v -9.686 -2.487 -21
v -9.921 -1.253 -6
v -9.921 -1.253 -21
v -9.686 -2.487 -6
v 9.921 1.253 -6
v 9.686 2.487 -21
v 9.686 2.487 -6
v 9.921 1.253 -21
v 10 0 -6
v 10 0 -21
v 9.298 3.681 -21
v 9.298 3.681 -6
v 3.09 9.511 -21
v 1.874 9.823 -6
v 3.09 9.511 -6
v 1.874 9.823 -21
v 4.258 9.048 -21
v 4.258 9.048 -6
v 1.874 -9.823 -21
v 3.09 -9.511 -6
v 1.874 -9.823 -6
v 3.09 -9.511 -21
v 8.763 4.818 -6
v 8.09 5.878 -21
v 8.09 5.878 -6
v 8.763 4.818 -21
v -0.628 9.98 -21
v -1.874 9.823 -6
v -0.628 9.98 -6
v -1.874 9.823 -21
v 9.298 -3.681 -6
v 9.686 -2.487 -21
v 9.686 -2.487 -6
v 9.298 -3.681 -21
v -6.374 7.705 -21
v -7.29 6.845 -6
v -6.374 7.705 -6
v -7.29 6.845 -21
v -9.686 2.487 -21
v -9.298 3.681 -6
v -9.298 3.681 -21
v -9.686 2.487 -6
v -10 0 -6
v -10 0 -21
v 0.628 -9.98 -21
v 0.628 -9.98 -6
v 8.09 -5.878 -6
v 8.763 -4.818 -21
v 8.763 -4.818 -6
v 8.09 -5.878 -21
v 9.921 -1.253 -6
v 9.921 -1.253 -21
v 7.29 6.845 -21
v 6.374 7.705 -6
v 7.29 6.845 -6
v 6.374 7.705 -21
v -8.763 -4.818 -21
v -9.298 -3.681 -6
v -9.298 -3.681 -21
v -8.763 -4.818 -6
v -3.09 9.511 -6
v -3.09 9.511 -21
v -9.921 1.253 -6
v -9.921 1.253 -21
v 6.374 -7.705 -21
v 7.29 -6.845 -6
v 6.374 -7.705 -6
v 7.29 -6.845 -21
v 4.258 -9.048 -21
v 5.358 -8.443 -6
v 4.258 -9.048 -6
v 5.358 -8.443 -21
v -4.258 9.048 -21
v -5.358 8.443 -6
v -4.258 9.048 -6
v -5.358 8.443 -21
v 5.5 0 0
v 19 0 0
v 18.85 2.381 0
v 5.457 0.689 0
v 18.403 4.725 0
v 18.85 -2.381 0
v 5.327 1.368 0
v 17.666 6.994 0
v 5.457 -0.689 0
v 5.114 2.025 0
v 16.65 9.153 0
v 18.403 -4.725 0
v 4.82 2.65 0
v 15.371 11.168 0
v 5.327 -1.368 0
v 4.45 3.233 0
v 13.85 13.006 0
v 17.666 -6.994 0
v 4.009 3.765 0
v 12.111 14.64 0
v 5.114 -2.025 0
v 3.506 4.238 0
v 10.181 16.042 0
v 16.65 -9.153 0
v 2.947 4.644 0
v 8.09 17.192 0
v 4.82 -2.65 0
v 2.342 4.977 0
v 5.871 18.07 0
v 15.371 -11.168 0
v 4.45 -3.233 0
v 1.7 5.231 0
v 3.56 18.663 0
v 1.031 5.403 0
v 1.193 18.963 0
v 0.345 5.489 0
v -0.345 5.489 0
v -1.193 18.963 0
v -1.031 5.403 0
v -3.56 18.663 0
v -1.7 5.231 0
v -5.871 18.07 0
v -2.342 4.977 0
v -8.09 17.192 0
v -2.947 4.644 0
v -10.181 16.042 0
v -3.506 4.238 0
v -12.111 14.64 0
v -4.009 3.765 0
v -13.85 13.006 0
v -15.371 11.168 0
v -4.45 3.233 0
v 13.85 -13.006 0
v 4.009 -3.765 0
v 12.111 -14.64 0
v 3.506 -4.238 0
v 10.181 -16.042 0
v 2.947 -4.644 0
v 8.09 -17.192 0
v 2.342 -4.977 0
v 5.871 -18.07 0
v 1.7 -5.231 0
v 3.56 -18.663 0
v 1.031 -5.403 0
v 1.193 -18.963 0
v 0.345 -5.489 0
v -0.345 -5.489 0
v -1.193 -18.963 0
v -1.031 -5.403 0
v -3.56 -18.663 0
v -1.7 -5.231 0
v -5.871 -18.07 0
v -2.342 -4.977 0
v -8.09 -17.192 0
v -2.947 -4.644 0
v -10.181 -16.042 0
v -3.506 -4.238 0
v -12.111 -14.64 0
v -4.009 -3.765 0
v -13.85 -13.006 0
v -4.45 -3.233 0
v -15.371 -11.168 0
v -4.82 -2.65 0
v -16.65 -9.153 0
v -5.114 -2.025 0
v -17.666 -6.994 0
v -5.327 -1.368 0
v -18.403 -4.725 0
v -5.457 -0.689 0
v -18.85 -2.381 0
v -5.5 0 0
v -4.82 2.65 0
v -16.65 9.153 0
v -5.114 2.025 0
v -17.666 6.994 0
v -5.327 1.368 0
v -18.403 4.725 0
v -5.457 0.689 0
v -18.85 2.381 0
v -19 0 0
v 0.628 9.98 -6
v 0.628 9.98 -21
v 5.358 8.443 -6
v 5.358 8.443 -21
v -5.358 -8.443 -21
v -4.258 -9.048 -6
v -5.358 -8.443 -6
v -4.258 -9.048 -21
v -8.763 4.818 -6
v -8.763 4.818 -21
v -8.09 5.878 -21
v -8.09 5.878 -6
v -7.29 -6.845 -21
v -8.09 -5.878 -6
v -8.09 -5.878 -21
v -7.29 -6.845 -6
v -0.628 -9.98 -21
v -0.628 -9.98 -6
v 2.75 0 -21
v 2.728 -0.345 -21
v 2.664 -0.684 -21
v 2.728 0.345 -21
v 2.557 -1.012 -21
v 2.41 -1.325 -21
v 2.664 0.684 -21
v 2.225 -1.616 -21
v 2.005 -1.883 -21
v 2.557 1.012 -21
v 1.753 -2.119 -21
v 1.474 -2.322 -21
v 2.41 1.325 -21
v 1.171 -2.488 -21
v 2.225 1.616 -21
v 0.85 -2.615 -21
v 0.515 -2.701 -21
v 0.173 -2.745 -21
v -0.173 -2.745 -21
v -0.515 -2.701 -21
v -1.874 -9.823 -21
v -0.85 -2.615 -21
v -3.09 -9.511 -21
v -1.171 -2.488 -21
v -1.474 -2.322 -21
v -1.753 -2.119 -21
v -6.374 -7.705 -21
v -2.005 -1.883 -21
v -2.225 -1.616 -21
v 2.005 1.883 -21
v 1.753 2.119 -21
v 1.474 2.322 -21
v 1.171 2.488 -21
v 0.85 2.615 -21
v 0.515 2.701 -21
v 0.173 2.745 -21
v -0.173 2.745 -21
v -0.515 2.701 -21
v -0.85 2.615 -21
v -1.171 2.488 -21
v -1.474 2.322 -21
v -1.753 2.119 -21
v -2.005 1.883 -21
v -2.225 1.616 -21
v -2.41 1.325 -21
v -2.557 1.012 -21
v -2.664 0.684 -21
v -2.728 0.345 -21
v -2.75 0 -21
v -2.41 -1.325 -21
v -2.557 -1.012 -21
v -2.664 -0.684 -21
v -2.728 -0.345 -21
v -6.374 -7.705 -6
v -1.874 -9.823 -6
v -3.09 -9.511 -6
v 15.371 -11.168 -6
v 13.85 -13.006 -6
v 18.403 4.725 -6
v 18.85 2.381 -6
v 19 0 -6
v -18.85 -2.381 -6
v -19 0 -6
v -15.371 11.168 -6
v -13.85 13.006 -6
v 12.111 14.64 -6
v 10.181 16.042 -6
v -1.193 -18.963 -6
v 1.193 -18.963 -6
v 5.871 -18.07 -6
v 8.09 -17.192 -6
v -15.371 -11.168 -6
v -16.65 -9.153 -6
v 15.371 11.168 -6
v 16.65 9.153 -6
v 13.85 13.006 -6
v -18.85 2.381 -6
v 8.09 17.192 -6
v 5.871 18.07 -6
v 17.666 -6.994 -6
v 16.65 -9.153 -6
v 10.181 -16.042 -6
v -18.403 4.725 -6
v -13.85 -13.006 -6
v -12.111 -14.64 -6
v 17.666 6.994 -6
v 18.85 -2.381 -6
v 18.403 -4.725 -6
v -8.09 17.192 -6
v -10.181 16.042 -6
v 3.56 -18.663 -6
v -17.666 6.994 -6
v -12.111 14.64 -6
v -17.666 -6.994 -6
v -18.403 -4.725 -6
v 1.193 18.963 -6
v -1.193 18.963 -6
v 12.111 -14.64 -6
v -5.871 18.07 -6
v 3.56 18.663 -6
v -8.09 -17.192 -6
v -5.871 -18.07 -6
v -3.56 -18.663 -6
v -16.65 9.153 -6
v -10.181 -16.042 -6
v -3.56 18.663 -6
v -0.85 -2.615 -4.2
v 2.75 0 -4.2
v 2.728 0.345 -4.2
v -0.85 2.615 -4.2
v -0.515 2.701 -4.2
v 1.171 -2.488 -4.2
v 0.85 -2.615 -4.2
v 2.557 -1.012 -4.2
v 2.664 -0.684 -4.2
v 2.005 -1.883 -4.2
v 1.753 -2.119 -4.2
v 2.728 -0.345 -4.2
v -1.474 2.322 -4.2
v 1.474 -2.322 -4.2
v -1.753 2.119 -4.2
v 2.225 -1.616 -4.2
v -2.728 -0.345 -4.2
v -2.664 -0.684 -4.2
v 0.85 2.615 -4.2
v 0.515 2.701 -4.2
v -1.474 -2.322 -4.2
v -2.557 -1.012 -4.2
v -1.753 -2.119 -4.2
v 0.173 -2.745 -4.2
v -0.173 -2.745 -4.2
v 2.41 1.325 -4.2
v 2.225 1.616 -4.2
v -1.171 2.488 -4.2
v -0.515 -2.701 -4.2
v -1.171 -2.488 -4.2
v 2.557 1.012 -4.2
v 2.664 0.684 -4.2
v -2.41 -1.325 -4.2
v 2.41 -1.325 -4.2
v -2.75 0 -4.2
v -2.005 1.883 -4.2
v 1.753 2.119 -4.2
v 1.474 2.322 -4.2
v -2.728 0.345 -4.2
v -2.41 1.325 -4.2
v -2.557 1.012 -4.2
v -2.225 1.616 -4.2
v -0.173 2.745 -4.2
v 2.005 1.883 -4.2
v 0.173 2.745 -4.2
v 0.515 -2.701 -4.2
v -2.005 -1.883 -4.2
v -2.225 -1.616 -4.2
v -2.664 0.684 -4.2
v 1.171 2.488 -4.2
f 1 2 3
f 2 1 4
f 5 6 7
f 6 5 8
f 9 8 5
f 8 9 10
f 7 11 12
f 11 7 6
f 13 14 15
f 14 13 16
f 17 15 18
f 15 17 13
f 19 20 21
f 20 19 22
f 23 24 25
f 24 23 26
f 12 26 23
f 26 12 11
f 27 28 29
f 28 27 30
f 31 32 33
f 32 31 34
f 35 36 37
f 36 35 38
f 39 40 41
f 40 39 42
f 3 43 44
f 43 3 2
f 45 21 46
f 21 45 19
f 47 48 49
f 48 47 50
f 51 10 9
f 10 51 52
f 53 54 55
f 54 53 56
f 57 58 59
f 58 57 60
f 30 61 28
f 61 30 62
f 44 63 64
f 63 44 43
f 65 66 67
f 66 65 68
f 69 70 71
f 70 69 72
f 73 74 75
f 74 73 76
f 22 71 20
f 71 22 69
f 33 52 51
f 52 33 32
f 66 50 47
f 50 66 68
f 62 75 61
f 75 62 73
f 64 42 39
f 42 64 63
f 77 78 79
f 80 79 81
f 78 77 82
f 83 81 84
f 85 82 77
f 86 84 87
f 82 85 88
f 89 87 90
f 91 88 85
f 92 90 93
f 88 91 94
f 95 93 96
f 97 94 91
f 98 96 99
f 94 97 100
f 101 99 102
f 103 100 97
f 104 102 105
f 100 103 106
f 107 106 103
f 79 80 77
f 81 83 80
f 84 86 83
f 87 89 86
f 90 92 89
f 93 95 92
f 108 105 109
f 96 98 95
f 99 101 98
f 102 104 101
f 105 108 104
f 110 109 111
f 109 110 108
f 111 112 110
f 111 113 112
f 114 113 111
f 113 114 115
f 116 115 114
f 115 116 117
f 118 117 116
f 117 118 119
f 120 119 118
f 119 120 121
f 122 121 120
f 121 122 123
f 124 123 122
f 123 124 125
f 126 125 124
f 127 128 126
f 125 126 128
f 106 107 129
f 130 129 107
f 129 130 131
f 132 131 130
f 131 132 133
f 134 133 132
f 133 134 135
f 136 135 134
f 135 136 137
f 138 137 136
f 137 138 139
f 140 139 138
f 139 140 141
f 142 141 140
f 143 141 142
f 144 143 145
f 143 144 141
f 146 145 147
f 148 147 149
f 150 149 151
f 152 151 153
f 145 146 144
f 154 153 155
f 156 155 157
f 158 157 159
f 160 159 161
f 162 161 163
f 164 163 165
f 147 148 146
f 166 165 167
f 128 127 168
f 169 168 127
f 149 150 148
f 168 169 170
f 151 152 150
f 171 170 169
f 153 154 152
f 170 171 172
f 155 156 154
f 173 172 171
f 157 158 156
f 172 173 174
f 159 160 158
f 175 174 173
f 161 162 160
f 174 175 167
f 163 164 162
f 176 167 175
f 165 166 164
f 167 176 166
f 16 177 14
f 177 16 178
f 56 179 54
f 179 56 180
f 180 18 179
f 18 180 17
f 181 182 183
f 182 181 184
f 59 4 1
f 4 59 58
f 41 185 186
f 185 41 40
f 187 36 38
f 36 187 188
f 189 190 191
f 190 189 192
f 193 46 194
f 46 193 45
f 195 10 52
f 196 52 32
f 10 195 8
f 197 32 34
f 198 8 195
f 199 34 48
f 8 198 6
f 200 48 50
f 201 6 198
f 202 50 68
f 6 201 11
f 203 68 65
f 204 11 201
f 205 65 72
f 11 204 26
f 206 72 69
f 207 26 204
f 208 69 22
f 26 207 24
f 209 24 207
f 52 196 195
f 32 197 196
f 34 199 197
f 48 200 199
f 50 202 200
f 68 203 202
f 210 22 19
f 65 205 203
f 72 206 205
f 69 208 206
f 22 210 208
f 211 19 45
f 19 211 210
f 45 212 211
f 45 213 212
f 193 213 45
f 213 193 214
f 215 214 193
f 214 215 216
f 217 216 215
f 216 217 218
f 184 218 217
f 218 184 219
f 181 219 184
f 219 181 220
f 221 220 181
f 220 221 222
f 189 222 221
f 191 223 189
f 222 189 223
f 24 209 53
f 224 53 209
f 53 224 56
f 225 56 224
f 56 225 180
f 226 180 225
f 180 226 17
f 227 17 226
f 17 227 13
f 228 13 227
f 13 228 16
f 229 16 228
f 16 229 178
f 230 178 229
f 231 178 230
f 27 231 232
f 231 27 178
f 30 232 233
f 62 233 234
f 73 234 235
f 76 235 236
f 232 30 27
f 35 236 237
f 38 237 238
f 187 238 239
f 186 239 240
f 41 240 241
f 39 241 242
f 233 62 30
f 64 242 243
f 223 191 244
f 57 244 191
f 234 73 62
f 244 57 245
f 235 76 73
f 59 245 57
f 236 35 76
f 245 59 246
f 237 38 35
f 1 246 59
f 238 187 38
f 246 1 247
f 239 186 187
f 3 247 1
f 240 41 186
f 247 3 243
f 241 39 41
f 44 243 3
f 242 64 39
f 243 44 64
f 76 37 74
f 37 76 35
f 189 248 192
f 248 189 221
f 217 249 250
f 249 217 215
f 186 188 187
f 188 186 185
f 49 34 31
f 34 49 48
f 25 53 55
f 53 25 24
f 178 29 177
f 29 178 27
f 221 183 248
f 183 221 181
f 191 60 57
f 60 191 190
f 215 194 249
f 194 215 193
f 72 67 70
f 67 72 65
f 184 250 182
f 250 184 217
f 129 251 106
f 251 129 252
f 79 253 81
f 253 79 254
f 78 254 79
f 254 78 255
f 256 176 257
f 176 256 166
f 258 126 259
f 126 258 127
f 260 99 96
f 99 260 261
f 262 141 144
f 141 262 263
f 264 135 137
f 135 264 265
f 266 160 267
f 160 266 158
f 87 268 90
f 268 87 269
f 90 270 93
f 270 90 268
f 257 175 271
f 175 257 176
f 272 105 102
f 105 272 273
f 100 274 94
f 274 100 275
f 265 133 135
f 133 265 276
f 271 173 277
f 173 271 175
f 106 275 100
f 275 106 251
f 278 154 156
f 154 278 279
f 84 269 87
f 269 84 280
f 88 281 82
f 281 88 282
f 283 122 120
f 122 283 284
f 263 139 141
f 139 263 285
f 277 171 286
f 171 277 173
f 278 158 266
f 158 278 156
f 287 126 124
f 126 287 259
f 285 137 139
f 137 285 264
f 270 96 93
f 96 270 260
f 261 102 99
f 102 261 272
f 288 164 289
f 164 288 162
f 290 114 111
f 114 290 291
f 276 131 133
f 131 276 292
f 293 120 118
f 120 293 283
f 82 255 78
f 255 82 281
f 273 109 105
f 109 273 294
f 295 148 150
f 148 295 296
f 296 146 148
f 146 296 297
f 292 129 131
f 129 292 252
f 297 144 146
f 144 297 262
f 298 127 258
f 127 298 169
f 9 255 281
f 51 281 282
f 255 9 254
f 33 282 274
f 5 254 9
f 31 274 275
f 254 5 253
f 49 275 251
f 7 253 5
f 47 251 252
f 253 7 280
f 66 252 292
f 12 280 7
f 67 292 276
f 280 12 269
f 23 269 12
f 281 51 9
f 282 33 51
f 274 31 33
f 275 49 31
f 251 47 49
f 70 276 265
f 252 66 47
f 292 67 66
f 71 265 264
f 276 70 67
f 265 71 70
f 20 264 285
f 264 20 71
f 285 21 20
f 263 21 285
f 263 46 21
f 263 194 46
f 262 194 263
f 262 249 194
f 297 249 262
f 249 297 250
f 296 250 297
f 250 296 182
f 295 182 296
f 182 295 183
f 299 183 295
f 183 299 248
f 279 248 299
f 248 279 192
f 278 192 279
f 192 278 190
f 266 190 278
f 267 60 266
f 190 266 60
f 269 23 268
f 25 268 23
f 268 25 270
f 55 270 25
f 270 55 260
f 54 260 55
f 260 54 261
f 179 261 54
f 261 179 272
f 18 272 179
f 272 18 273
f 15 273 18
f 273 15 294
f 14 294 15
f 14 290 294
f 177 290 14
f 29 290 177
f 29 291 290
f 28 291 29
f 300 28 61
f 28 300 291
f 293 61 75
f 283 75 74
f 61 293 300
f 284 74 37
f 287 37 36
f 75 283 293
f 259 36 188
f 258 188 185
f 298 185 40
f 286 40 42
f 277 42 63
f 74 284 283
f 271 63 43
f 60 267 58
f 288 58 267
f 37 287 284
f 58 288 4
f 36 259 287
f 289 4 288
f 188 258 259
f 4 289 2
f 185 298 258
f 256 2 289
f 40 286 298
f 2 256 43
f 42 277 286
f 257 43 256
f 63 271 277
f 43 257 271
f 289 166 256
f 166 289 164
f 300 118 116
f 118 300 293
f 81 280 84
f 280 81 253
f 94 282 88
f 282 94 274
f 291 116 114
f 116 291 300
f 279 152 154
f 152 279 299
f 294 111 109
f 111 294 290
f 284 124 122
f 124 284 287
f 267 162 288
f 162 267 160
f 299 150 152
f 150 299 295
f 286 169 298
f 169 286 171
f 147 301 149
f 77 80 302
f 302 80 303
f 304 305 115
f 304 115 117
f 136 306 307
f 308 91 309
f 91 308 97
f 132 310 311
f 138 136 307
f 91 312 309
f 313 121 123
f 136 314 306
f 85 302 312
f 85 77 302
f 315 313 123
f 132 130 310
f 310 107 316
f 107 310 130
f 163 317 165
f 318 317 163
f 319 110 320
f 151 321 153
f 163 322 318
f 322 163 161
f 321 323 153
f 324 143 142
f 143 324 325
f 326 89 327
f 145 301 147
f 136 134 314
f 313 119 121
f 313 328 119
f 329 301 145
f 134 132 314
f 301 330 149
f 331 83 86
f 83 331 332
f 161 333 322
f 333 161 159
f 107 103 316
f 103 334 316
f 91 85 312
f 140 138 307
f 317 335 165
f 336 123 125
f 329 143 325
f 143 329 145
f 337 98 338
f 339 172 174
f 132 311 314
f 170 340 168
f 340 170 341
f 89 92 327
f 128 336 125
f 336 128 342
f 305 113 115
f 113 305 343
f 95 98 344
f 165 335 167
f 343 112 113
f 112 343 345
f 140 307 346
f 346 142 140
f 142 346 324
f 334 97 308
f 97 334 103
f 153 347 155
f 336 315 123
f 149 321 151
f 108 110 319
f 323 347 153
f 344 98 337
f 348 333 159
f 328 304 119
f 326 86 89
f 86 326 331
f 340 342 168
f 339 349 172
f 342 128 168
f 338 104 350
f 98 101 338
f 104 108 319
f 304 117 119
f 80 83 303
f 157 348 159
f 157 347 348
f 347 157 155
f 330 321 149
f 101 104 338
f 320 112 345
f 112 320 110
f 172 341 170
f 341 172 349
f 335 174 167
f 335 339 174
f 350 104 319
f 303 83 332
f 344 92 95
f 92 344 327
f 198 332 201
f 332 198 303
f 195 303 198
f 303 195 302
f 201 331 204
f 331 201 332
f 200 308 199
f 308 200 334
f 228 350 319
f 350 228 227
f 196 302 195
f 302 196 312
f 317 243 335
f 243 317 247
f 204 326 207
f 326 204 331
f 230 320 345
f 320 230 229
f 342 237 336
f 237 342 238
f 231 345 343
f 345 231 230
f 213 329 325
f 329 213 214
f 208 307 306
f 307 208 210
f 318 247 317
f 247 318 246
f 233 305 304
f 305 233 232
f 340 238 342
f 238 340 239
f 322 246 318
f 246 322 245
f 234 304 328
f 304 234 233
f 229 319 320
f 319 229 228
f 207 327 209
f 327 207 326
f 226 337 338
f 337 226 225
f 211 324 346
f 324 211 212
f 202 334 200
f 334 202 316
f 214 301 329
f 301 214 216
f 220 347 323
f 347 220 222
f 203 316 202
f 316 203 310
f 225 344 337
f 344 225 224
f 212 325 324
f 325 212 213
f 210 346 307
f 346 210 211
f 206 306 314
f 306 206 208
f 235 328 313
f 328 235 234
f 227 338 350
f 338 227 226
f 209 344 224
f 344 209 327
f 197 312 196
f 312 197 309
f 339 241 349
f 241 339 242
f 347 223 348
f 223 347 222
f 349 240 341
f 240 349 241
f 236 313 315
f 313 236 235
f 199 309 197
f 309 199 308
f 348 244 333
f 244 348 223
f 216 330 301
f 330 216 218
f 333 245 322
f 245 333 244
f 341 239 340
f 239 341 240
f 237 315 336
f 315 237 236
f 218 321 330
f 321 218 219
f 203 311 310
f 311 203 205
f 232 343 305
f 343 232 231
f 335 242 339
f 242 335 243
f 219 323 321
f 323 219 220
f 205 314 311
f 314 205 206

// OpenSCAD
$fn = 50;


difference() {
	union() {
		translate(v = [0, 0, -21.0000000000]) {
			cylinder(h = 21, r = 10.0000000000);
		}
		translate(v = [0, 0, -6.0000000000]) {
			cylinder(h = 6, r = 19.0000000000);
		}
	}
	union() {
		translate(v = [0, 0, 0]) {
			rotate(a = [0, 0, 0]) {
				difference() {
					union() {
						#translate(v = [0, 0, -21.0000000000]) {
							cylinder(h = 21, r = 2.2500000000);
						}
						#translate(v = [0, 0, -4.2000000000]) {
							cylinder(h = 4.2000000000, r = 10.0000000000, r1 = 2.7500000000, r2 = 5.5000000000);
						}
						#translate(v = [0, 0, -21.0000000000]) {
							cylinder(h = 21, r = 2.7500000000);
						}
						#translate(v = [0, 0, -21.0000000000]) {
							cylinder(h = 21, r = 2.2500000000);
						}
					}
					union();
				}
			}
		}
	}
}
